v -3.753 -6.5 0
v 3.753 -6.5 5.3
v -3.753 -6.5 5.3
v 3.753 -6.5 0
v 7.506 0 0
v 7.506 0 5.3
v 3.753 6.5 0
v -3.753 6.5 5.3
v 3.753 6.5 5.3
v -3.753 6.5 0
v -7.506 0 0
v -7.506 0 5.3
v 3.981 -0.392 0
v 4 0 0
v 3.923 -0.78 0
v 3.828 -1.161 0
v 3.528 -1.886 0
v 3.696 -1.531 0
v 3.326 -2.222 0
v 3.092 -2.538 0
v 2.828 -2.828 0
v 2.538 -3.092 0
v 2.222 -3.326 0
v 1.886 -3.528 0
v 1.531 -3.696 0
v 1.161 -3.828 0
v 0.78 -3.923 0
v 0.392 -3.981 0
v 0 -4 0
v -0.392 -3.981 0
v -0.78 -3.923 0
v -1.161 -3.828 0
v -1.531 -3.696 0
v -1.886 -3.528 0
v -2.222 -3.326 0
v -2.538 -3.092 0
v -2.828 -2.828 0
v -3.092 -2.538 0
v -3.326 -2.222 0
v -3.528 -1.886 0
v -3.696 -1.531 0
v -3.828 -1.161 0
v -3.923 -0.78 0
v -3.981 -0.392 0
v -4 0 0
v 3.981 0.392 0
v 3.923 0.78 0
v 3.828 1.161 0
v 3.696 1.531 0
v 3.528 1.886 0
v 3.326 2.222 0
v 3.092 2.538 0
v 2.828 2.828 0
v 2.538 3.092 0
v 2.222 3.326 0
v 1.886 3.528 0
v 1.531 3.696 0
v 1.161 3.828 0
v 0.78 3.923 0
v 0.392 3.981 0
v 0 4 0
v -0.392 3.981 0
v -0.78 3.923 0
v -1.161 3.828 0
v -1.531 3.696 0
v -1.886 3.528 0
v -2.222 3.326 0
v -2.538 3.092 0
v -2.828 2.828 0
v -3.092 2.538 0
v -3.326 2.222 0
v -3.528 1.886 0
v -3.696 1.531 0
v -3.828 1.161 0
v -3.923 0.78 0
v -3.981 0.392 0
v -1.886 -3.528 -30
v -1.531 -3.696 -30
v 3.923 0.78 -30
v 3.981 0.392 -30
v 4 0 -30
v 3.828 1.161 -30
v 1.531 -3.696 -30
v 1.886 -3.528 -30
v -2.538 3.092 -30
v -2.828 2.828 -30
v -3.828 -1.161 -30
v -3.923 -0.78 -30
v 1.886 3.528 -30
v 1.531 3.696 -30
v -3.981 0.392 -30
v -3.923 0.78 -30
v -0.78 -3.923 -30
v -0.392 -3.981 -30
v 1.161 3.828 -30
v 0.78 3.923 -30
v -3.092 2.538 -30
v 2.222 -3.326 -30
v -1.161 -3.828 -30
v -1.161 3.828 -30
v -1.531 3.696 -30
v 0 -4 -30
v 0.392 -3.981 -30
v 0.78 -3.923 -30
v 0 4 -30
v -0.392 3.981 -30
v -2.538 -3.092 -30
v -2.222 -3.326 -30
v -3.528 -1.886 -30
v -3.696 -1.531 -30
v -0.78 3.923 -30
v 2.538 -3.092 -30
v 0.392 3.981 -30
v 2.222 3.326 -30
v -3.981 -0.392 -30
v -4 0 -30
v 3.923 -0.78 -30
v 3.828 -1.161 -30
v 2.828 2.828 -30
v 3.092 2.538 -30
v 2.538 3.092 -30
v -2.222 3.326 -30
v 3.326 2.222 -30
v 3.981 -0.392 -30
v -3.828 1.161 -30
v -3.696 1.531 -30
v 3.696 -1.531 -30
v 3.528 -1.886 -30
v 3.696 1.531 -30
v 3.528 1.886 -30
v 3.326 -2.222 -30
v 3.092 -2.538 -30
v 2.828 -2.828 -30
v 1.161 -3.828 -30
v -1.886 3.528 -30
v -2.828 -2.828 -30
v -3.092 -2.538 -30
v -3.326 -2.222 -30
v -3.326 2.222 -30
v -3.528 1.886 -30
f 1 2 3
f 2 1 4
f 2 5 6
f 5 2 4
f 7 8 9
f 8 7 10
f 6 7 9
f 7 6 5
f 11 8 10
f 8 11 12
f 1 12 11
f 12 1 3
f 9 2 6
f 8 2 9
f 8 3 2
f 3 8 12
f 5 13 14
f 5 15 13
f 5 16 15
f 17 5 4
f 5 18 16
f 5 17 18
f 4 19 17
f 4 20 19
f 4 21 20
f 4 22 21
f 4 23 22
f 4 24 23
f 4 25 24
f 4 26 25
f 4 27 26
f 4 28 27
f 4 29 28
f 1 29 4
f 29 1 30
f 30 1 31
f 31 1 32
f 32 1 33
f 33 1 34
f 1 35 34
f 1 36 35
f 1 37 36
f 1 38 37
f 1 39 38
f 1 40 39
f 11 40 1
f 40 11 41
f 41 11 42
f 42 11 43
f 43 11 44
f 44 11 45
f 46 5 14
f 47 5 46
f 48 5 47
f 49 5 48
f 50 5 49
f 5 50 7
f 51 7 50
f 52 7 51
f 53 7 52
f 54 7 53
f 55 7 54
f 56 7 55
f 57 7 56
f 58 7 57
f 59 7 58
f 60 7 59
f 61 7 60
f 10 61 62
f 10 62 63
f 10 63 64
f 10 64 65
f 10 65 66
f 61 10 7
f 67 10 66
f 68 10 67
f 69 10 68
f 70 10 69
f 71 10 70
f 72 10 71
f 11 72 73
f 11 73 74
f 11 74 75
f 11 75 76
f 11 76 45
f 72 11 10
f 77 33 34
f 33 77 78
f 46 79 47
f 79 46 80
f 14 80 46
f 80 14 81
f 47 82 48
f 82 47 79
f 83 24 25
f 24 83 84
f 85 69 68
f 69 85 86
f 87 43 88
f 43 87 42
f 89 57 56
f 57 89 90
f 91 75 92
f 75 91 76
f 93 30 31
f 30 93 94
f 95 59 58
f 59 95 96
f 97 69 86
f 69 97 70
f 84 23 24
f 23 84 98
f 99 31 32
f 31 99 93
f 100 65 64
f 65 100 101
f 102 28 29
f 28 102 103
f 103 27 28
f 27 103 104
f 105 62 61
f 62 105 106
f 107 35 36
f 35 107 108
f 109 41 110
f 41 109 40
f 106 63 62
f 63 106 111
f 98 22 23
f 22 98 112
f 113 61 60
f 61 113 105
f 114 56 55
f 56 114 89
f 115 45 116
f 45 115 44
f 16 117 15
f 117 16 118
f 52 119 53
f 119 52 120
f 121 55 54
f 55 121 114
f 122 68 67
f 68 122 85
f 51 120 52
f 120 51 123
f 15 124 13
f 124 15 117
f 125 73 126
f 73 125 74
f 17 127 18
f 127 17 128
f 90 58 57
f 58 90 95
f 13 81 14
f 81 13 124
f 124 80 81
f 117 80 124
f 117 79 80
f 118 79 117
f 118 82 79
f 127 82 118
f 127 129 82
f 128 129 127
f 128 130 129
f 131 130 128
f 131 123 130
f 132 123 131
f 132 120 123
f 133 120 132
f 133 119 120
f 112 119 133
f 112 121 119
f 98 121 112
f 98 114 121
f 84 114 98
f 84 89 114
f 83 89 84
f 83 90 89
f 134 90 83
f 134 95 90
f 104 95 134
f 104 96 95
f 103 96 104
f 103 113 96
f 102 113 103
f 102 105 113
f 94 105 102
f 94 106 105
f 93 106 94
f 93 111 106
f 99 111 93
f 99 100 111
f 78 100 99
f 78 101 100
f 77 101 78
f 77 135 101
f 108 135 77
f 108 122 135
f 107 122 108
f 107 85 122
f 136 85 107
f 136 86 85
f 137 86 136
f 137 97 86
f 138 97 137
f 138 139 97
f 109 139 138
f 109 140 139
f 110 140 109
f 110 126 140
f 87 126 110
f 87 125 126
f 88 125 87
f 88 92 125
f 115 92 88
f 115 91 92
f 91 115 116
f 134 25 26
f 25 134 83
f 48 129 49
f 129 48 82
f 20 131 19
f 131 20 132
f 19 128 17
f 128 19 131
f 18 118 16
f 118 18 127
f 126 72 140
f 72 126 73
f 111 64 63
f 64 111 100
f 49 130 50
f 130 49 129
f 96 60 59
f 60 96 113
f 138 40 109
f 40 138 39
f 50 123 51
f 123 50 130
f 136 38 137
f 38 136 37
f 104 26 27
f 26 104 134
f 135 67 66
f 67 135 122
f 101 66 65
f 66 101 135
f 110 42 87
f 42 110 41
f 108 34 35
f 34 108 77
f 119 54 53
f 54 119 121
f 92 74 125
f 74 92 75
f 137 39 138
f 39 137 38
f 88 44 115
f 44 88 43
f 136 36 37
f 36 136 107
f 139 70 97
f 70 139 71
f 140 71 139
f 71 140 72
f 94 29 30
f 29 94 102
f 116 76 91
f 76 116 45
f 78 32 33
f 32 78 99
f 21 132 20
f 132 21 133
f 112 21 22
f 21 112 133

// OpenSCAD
$fn = 64;

across_flats = 13;
head_height  = 5.3;
shank_diameter = 8;
shank_length = 30;

union() {
    cylinder(
        h = head_height,
        r = across_flats / sqrt(3),
        $fn = 6
    );

    translate([0, 0, -shank_length])
        cylinder(
            h = shank_length,
            d = shank_diameter
        );
}
